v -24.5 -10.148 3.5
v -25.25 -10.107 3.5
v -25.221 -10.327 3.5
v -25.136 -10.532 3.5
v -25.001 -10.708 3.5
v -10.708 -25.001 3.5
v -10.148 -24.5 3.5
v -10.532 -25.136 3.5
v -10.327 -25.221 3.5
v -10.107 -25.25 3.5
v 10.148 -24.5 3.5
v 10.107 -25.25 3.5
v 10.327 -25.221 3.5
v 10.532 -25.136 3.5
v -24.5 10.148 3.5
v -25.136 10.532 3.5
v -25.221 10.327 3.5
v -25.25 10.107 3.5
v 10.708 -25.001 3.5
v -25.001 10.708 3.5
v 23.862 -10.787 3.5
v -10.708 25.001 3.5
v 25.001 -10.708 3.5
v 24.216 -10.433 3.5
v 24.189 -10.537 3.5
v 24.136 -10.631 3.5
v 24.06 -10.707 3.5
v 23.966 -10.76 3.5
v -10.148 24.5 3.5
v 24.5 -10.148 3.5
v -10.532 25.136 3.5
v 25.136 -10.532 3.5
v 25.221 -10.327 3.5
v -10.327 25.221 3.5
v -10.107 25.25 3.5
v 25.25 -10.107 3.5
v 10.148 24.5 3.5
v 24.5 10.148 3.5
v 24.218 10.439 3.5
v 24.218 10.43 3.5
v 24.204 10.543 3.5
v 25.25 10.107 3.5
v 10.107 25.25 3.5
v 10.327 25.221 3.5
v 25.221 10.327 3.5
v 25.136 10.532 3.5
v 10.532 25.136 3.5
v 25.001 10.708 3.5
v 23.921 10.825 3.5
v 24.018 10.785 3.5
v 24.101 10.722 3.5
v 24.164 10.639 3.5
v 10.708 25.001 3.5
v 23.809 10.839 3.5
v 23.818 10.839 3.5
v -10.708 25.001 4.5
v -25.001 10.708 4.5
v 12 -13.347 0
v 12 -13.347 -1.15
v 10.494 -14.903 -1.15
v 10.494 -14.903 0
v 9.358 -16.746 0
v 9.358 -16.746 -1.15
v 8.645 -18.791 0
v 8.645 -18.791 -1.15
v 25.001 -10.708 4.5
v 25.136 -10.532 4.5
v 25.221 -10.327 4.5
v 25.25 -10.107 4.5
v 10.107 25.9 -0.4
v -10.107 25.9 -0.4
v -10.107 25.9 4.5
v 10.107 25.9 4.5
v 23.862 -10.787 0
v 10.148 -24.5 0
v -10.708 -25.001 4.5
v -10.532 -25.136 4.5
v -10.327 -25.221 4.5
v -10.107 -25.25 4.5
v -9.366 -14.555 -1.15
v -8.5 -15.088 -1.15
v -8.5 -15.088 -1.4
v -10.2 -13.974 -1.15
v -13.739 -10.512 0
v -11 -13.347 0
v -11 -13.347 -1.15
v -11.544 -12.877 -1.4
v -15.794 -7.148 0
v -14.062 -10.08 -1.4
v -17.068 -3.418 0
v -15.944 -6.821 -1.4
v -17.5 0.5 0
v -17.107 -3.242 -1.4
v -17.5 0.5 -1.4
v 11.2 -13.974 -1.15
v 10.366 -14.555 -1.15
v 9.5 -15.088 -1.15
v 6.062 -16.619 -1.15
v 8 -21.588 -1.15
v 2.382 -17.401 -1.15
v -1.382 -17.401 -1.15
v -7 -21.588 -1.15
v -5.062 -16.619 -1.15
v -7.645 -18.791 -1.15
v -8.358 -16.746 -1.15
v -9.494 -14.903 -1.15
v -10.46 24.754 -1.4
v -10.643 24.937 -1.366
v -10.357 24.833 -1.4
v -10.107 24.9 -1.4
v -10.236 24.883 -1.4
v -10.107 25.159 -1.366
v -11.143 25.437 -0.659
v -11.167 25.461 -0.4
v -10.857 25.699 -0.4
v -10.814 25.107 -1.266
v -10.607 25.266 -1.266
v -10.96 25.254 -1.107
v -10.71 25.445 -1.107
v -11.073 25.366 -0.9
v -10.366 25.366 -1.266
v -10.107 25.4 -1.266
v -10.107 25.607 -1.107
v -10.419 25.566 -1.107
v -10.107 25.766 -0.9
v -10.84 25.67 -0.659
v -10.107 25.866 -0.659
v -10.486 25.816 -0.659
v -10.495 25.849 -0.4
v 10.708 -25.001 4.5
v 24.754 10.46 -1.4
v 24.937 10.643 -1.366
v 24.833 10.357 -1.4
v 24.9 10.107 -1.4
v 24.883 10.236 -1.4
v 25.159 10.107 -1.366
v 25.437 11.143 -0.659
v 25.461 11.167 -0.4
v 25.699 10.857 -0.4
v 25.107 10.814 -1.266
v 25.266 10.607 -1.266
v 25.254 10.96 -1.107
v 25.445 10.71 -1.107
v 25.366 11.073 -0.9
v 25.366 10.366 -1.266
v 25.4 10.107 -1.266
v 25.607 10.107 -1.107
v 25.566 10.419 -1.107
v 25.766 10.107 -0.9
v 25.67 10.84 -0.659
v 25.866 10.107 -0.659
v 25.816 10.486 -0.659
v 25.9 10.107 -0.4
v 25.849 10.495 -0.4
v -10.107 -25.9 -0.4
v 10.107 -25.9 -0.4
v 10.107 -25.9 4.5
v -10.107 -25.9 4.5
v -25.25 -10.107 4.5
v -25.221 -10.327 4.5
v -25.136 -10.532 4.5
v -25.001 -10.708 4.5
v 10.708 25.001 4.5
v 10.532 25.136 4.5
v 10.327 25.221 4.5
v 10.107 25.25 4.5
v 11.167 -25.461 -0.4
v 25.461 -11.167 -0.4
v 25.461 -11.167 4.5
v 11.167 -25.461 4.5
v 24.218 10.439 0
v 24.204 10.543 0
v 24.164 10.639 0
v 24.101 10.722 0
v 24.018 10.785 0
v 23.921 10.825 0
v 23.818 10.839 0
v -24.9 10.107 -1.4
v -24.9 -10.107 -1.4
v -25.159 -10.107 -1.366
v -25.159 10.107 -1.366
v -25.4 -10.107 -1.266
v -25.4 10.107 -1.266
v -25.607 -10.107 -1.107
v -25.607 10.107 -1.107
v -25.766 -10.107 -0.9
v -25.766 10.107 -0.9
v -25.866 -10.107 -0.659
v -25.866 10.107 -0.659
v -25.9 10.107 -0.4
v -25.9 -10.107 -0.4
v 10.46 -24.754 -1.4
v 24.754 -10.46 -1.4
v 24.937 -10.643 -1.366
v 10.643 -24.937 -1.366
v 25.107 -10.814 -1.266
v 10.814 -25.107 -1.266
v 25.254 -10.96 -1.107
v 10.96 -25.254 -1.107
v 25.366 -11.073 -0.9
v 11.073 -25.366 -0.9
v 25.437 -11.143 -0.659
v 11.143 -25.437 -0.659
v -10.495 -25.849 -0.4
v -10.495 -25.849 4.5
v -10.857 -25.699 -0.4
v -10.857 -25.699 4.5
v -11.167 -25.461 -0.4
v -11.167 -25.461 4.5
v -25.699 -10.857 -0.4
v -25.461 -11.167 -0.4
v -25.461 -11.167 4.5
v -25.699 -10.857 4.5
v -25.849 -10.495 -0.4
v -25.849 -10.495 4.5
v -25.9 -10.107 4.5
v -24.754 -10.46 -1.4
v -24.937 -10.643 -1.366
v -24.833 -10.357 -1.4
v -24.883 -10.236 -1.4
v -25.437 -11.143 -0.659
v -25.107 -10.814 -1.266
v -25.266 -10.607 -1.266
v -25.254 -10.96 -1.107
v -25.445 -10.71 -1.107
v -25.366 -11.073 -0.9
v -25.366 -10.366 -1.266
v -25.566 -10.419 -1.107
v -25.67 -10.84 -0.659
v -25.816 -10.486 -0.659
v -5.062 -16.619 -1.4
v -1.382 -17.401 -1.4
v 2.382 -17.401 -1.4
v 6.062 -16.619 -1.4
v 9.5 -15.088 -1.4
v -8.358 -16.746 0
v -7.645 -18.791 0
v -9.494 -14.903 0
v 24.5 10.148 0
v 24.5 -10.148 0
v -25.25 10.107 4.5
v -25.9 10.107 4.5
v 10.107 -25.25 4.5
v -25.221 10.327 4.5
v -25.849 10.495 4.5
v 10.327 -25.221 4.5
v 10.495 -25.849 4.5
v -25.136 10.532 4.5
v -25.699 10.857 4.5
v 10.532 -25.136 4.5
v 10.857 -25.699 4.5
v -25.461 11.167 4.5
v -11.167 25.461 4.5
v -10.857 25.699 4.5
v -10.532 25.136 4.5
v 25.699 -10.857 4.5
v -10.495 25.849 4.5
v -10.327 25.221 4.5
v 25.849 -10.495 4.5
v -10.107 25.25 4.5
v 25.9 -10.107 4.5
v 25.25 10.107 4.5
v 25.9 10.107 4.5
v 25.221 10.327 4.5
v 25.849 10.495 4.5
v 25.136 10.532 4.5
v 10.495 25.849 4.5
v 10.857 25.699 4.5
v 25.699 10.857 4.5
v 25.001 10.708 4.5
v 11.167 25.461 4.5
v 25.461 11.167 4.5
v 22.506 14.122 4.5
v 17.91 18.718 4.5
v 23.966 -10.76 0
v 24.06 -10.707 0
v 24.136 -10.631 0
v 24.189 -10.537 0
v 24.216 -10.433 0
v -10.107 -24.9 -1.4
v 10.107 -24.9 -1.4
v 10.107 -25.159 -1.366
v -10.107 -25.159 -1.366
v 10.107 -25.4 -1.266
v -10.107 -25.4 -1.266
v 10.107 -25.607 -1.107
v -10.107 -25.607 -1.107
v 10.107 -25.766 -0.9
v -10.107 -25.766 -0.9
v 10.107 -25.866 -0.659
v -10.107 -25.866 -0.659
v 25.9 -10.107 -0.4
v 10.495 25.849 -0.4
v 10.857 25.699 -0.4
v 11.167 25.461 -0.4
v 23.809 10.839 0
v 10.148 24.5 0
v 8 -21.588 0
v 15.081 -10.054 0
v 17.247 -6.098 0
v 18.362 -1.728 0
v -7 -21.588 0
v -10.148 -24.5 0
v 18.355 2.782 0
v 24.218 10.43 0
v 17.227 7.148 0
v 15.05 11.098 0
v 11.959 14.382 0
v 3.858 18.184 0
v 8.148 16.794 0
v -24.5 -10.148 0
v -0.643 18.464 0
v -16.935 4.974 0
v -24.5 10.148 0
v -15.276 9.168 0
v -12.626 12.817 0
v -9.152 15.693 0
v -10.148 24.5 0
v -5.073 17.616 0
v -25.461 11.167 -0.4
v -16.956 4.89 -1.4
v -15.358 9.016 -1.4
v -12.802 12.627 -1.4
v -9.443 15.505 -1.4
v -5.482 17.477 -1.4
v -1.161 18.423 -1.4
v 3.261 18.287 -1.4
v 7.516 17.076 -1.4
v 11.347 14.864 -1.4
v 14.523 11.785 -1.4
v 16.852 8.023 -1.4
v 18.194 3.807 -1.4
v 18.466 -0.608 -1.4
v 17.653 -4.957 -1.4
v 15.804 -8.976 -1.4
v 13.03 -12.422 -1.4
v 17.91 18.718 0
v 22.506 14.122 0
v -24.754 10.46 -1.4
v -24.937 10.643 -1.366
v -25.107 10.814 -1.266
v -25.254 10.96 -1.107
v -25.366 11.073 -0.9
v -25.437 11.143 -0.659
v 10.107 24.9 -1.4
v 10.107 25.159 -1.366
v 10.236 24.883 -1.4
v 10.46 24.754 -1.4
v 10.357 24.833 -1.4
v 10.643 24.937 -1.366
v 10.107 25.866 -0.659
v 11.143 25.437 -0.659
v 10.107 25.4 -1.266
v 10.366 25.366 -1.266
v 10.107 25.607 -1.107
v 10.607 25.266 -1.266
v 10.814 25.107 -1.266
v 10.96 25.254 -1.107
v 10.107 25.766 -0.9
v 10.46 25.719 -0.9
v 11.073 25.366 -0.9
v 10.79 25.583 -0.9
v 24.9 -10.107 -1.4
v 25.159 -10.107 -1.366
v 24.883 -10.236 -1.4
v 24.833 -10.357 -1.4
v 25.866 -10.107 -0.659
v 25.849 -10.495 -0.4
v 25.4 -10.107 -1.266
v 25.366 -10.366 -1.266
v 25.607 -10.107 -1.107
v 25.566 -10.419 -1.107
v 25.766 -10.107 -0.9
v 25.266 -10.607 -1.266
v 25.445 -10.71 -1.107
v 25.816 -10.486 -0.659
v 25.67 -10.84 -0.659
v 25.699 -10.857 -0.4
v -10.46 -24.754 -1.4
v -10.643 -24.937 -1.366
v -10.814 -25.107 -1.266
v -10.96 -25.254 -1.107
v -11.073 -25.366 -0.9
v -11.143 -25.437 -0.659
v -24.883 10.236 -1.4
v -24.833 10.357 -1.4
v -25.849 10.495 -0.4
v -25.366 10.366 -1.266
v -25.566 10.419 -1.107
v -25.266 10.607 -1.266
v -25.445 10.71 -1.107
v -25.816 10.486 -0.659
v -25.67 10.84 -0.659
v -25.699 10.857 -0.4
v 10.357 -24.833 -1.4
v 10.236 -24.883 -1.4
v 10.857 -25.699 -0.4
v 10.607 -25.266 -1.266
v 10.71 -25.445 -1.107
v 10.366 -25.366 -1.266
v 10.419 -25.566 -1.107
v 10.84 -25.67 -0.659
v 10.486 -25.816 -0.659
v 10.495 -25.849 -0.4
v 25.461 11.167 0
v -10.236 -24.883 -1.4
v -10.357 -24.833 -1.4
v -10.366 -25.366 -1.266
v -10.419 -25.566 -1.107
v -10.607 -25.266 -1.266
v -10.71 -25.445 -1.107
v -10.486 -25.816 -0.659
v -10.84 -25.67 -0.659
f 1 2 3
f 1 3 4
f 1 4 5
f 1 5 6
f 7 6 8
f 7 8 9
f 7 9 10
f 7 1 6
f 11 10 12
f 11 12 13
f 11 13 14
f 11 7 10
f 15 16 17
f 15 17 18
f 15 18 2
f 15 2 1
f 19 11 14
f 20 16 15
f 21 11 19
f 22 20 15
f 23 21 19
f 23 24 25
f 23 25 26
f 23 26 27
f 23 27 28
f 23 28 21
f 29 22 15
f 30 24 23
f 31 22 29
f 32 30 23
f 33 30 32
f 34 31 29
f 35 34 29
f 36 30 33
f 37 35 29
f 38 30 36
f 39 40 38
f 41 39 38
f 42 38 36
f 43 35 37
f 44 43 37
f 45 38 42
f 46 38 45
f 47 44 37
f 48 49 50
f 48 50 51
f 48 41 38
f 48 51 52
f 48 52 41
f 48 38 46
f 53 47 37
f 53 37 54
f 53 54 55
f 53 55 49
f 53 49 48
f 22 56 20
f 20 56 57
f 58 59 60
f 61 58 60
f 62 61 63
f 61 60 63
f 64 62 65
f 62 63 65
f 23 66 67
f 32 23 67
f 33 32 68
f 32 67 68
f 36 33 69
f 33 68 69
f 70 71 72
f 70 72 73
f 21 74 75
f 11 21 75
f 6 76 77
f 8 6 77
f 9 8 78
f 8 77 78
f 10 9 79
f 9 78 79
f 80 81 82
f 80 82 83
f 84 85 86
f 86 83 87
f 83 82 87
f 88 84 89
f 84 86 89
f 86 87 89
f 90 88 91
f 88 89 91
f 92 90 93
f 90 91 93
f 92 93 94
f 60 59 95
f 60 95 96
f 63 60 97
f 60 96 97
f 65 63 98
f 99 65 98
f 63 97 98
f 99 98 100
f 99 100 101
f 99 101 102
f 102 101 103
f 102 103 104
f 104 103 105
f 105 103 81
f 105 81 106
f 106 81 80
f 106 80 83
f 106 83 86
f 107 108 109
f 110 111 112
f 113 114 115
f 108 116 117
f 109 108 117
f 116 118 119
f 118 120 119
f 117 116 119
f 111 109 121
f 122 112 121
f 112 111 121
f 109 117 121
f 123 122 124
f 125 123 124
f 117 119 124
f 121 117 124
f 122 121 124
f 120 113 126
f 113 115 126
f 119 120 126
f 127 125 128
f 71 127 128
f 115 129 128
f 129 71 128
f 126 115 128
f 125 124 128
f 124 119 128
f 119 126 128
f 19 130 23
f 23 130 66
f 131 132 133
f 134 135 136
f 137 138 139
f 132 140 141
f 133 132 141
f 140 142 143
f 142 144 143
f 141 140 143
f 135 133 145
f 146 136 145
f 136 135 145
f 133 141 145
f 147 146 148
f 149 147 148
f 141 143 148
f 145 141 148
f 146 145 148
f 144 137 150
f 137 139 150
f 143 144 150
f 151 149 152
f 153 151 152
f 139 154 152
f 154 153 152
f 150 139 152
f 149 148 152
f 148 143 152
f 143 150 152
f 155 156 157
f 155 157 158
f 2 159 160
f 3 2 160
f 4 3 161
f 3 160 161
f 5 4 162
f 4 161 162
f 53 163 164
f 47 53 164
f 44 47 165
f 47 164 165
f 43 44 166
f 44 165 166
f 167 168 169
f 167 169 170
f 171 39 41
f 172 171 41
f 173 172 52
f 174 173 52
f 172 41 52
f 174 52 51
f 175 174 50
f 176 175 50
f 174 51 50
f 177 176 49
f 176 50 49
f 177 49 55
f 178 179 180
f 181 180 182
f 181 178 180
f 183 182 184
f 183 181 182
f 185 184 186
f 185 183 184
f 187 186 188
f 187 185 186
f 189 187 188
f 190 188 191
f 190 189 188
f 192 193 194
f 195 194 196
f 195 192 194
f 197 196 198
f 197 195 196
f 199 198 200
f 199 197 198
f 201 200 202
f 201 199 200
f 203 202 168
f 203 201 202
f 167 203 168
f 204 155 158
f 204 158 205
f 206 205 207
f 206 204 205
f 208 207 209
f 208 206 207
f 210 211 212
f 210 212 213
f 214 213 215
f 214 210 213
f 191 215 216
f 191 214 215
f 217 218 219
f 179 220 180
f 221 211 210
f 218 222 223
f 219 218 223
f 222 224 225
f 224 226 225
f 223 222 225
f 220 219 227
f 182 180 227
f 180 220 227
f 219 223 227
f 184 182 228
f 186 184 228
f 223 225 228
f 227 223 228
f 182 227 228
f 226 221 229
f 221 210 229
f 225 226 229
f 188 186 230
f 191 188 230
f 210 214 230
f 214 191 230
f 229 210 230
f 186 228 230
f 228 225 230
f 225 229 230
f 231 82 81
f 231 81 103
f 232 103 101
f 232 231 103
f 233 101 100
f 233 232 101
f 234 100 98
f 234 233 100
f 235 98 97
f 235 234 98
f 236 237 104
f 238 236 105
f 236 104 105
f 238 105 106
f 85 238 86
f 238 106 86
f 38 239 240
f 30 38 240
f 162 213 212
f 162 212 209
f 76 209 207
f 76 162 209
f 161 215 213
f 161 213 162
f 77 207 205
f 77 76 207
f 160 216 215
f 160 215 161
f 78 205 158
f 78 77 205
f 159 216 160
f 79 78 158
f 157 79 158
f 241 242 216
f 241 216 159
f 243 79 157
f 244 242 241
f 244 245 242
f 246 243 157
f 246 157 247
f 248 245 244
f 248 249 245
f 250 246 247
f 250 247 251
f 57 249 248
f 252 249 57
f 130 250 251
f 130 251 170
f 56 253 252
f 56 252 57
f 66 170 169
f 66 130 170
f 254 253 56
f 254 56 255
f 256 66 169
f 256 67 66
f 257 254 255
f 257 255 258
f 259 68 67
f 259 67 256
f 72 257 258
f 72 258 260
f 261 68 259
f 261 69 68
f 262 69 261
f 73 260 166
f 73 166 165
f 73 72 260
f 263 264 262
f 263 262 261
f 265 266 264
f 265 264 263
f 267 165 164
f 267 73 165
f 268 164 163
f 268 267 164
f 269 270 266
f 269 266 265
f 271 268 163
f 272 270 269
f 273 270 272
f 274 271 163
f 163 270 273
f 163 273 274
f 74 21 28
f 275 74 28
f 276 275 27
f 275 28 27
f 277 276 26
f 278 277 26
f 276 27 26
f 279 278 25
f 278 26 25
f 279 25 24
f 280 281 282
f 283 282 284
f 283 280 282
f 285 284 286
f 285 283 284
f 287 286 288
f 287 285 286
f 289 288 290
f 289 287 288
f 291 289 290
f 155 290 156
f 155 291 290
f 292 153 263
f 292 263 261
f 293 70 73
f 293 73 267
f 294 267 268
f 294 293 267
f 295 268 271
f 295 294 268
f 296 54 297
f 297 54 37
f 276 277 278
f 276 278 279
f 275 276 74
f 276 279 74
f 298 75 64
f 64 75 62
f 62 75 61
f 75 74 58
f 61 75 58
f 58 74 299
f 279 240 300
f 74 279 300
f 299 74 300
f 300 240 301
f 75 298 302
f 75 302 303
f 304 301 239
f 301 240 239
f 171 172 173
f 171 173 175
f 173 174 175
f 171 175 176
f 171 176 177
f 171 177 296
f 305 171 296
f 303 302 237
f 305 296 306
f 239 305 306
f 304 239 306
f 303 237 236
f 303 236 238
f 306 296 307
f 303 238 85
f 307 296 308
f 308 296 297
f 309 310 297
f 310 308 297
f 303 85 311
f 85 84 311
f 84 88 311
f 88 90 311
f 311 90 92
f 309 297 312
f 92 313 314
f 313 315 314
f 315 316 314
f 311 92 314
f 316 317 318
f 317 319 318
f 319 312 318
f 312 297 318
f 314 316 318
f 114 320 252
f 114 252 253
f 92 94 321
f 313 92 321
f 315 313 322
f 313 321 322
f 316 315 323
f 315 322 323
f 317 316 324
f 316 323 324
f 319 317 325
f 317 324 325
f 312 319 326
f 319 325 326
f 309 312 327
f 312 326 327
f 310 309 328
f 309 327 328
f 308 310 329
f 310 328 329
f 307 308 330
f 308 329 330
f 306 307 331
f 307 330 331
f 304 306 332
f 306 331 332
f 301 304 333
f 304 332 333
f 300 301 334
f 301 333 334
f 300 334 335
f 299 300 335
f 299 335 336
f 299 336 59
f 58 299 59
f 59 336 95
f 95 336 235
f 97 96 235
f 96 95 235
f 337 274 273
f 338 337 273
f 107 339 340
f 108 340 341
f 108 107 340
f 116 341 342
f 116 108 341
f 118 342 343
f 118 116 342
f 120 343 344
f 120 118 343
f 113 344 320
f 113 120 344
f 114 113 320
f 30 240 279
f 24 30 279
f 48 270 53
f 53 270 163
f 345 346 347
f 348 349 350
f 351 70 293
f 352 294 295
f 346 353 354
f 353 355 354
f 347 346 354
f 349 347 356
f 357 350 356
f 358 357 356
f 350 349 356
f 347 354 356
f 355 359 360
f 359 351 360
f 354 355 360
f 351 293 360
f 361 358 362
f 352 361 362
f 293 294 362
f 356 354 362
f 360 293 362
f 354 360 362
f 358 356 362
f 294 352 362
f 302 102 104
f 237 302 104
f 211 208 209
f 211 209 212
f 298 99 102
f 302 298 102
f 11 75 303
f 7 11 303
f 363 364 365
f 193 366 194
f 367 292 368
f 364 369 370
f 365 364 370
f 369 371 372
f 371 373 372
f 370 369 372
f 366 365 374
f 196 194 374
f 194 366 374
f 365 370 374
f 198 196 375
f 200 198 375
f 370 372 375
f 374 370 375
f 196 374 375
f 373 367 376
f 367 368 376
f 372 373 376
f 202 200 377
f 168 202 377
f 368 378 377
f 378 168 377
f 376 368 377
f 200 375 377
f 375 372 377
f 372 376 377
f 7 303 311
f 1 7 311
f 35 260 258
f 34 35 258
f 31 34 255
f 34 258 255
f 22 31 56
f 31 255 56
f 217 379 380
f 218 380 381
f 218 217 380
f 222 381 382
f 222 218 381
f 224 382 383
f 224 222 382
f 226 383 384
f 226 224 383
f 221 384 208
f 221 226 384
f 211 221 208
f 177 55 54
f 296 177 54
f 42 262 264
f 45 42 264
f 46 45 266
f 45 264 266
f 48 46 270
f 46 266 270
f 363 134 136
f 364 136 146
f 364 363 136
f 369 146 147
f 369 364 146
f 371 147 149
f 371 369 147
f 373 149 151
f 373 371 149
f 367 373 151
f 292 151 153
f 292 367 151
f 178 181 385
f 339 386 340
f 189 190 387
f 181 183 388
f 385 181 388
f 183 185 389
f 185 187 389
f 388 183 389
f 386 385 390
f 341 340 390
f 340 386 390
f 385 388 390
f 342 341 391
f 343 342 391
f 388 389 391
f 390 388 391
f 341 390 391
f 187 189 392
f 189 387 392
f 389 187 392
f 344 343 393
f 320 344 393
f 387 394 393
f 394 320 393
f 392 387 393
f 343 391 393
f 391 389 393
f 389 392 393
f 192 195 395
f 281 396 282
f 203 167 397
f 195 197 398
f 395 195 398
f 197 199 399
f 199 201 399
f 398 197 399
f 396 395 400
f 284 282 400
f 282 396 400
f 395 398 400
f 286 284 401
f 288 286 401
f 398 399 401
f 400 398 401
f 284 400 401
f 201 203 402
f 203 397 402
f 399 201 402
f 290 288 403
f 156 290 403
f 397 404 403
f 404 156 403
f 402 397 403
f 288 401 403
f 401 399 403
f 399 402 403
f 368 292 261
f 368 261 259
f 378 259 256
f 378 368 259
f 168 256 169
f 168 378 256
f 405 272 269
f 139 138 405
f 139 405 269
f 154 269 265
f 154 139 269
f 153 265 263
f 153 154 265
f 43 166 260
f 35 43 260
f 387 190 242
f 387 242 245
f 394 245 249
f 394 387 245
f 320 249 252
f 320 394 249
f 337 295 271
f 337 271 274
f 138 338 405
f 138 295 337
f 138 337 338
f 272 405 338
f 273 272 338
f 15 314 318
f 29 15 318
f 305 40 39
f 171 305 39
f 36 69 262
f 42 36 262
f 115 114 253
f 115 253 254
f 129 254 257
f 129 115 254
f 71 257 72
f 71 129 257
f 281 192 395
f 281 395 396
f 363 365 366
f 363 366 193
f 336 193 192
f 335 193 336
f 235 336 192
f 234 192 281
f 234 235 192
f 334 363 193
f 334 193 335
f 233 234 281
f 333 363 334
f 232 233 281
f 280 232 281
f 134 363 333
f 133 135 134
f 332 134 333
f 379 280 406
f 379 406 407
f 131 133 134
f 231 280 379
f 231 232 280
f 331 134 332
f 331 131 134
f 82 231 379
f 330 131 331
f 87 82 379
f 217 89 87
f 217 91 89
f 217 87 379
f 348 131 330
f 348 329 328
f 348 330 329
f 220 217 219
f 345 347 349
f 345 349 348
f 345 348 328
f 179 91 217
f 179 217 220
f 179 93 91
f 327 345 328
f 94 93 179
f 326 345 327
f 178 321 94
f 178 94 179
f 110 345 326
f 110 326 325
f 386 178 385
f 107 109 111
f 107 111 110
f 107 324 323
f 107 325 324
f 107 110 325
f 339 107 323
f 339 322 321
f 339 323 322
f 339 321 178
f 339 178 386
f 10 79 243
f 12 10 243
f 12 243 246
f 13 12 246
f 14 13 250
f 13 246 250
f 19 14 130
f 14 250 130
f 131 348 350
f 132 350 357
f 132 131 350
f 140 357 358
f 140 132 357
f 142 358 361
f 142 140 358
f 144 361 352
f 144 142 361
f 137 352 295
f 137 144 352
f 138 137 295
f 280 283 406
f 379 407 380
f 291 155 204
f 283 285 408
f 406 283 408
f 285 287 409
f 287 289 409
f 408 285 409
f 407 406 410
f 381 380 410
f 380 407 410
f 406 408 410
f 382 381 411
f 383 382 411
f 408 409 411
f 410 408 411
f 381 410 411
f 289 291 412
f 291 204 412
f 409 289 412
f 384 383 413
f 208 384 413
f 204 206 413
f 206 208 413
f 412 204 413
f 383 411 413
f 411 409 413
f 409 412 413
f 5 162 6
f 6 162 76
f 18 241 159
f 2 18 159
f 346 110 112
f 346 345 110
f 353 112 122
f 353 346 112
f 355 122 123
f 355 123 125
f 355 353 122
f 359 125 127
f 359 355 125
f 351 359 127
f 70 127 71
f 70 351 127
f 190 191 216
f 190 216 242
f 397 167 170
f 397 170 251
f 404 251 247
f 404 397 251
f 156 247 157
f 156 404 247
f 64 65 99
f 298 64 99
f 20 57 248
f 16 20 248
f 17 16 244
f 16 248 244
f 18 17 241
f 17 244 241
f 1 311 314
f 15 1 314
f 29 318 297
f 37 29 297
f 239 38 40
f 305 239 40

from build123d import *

# Parameters (mm, degrees)
BOSS_EXTRUDE1_DEPTH   = 8.5
BOSS_EXTRUDE1_2_DEPTH = 8.5
BOSS_EXTRUDE1_3_DEPTH = 8.5
BOSS_EXTRUDE1_4_DEPTH = 8.5
BOSS_EXTRUDE2_DEPTH   = 1.4
BOSS_EXTRUDE3_DEPTH   = 8.5
BOSS_EXTRUDE5_DEPTH   = 1
CUT_EXTRUDE1_DEPTH    = 38.942456431
CUT_EXTRUDE2_DEPTH    = 38.942456431
FILLET1_R             = 1
BOSS_EXTRUDE6_START   = 1.4
BOSS_EXTRUDE6_DEPTH   = 1.4
FILLET2_R             = 1
CUT_EXTRUDE3_DEPTH    = 1.4
BOSS_EXTRUDE7_DEPTH   = 0.25
FILLET3_R             = 10
CUT_EXTRUDE4_START    = -5.9
CUT_EXTRUDE4_DEPTH    = 6
CUT_EXTRUDE5_DEPTH    = 1


with BuildPart() as part:
    # Sketch1 → Boss-Extrude1 (new body)
    with BuildSketch(Plane.XY):
        with BuildLine():
            Line((25.9, -10.106810922), (25.9, 10.106810922))
            ThreePointArc((25.9, 10.106810922), (25.785819299, 10.68083607), (25.460660172, 11.167471094))
            Line((25.460660172, 11.167471094), (22.50588745, 14.122243815))
            Line((22.50588745, 14.122243815), (21.515937957, 13.132294321))
            Line((21.515937957, 13.132294321), (24.5, 10.148232278))
            Line((24.5, 10.148232278), (24.5, -10.148232278))
            Line((24.5, -10.148232278), (21.692714652, -12.955517626))
            Line((21.692714652, -12.955517626), (22.682664146, -13.94546712))
            Line((22.682664146, -13.94546712), (25.460660172, -11.167471094))
            ThreePointArc((25.460660172, -11.167471094), (25.785819299, -10.68083607), (25.9, -10.106810922))
        make_face()
    extrude(amount=BOSS_EXTRUDE1_DEPTH)



with BuildPart() as body_2:
    # Sketch1 → Boss-Extrude1 2 (new body)
    with BuildSketch(Plane.XY):
        with BuildLine():
            Line((-16.177281759, -20.450849507), (-11.167471094, -25.460660172))
            ThreePointArc((-11.167471094, -25.460660172), (-10.68083607, -25.785819299), (-10.106810922, -25.9))
            Line((-10.106810922, -25.9), (10.106810922, -25.9))
            ThreePointArc((10.106810922, -25.9), (10.68083607, -25.785819299), (11.167471094, -25.460660172))
            Line((11.167471094, -25.460660172), (15.611596334, -21.016534932))
            Line((15.611596334, -21.016534932), (14.62164684, -20.026585438))
            Line((14.62164684, -20.026585438), (10.148232278, -24.5))
            Line((10.148232278, -24.5), (-10.148232278, -24.5))
            Line((-10.148232278, -24.5), (-15.187332265, -19.460900013))
            Line((-15.187332265, -19.460900013), (-16.177281759, -20.450849507))
        make_face()
    extrude(amount=BOSS_EXTRUDE1_2_DEPTH)


with BuildPart() as body_3:
    # Sketch1 → Boss-Extrude1 3 (new body)
    with BuildSketch(Plane.XY):
        with BuildLine():
            Line((-22.116978721, 14.511152545), (-25.460660172, 11.167471094))
            ThreePointArc((-25.460660172, 11.167471094), (-25.785819299, 10.68083607), (-25.9, 10.106810922))
            Line((-25.9, 10.106810922), (-25.9, -10.106810922))
            ThreePointArc((-25.9, -10.106810922), (-25.785819299, -10.68083607), (-25.460660172, -11.167471094))
            Line((-25.460660172, -11.167471094), (-22.187689399, -14.440441867))
            Line((-22.187689399, -14.440441867), (-21.197739905, -13.450492373))
            Line((-21.197739905, -13.450492373), (-24.5, -10.148232278))
            Line((-24.5, -10.148232278), (-24.5, 10.148232278))
            Line((-24.5, 10.148232278), (-21.127029227, 13.521203051))
            Line((-21.127029227, 13.521203051), (-22.116978721, 14.511152545))
        make_face()
    extrude(amount=BOSS_EXTRUDE1_3_DEPTH)


with BuildPart() as body_4:
    # Sketch1 → Boss-Extrude1 4 (new body)
    with BuildSketch(Plane.XY):
        with BuildLine():
            Line((10.106810922, 25.9), (-10.106810922, 25.9))
            ThreePointArc((-10.106810922, 25.9), (-10.68083607, 25.785819299), (-11.167471094, 25.460660172))
            Line((-11.167471094, 25.460660172), (-17.520784643, 19.107346623))
            Line((-17.520784643, 19.107346623), (-16.530835149, 18.117397129))
            Line((-16.530835149, 18.117397129), (-10.148232278, 24.5))
            Line((-10.148232278, 24.5), (10.148232278, 24.5))
            Line((10.148232278, 24.5), (16.919743879, 17.728488399))
            Line((16.919743879, 17.728488399), (17.909693373, 18.718437893))
            Line((17.909693373, 18.718437893), (11.167471094, 25.460660172))
            ThreePointArc((11.167471094, 25.460660172), (10.68083607, 25.785819299), (10.106810922, 25.9))
        make_face()
    extrude(amount=BOSS_EXTRUDE1_4_DEPTH)


with BuildPart() as part_1:
    add(part.part)

    add(body_2.part)  # Boss-Extrude2 merges body 2

    add(body_3.part)  # Boss-Extrude2 merges body 3

    add(body_4.part)  # Boss-Extrude2 merges body 4
    # Sketch2 → Boss-Extrude2 (add)
    with BuildSketch(Plane.XY.offset(8.5)):
        with BuildLine():
            ThreePointArc((25.460660172, -11.167471094), (25.785819299, -10.68083607), (25.9, -10.106810922))
            Line((25.9, -10.106810922), (25.9, 10.106810922))
            ThreePointArc((25.9, 10.106810922), (25.785819299, 10.68083607), (25.460660172, 11.167471094))
            Line((25.460660172, 11.167471094), (11.167471094, 25.460660172))
            ThreePointArc((11.167471094, 25.460660172), (10.68083607, 25.785819299), (10.106810922, 25.9))
            Line((10.106810922, 25.9), (-10.106810922, 25.9))
            ThreePointArc((-10.106810922, 25.9), (-10.68083607, 25.785819299), (-11.167471094, 25.460660172))
            Line((-11.167471094, 25.460660172), (-25.460660172, 11.167471094))
            ThreePointArc((-25.460660172, 11.167471094), (-25.785819299, 10.68083607), (-25.9, 10.106810922))
            Line((-25.9, 10.106810922), (-25.9, -10.106810922))
            ThreePointArc((-25.9, -10.106810922), (-25.785819299, -10.68083607), (-25.460660172, -11.167471094))
            Line((-25.460660172, -11.167471094), (-11.167471094, -25.460660172))
            ThreePointArc((-11.167471094, -25.460660172), (-10.68083607, -25.785819299), (-10.106810922, -25.9))
            Line((-10.106810922, -25.9), (10.106810922, -25.9))
            ThreePointArc((10.106810922, -25.9), (10.68083607, -25.785819299), (11.167471094, -25.460660172))
            Line((11.167471094, -25.460660172), (25.460660172, -11.167471094))
        make_face()
    extrude(amount=BOSS_EXTRUDE2_DEPTH)

    # Sketch3 → Boss-Extrude3 (add)
    with BuildSketch(Plane(origin=(0, 0, 8.5), x_dir=(-1, 0, 0), z_dir=(0, 0, -1))):
        Polygon((-21.515937957, 13.132294321), (-16.919743879, 17.728488399), (-17.909693373, 18.718437893), (-22.50588745, 14.122243815), align=None)
        Polygon((21.127029227, 13.521203051), (16.530835149, 18.117397129), (17.520784643, 19.107346623), (22.116978721, 14.511152545), align=None)
        Polygon((-21.692714652, -12.955517626), (-22.682664146, -13.94546712), (-15.611596334, -21.016534932), (-14.62164684, -20.026585438), align=None)
        Polygon((15.187332265, -19.460900013), (16.177281759, -20.450849507), (22.187689399, -14.440441867), (21.197739905, -13.450492373), align=None)
    extrude(amount=BOSS_EXTRUDE3_DEPTH)

    # Sketch5 → Boss-Extrude5 (add)
    with BuildSketch(Plane(origin=(0, 0, 8.5), x_dir=(-1, 0, 0), z_dir=(0, 0, -1))):
        Polygon((16.177281759, -20.450849507), (22.187689399, -14.440441867), (21.197739905, -13.450492373), (15.187332265, -19.460900013), align=None)
    extrude(amount=BOSS_EXTRUDE5_DEPTH)

    # Sketch6 → Cut-Extrude1 (cut, through all)
    with BuildSketch(Plane.XY.offset(9.9)):
        with BuildLine():
            Line((-20.332854575, -10.39399953), (-20.332854823, 10.43400047))
            ThreePointArc((-20.332854823, 10.43400047), (-20.450012114, 10.716843181), (-20.732854828, 10.834000465))
            Line((-20.732854828, 10.834000465), (-23.272854828, 10.834000435))
            ThreePointArc((-23.272854828, 10.834000435), (-23.555697539, 10.716843144), (-23.672854823, 10.43400043))
            Line((-23.672854823, 10.43400043), (-23.672854575, -10.39399957))
            ThreePointArc((-23.672854575, -10.39399957), (-23.555697284, -10.676842281), (-23.27285457, -10.793999565))
            Line((-23.27285457, -10.793999565), (-20.73285457, -10.793999535))
            ThreePointArc((-20.73285457, -10.793999535), (-20.450011859, -10.676842244), (-20.332854575, -10.39399953))
        make_face()
        with BuildLine():
            Line((21.277947318, -10.789000444), (23.817947318, -10.789000333))
            ThreePointArc((23.817947318, -10.789000333), (24.100790025, -10.671843033), (24.217947301, -10.389000316))
            Line((24.217947301, -10.389000316), (24.21794639, 10.438999684))
            ThreePointArc((24.21794639, 10.438999684), (24.10078909, 10.721842391), (23.817946373, 10.838999667))
            Line((23.817946373, 10.838999667), (21.277946373, 10.838999556))
            ThreePointArc((21.277946373, 10.838999556), (20.995103665, 10.721842256), (20.87794639, 10.438999538))
            Line((20.87794639, 10.438999538), (20.877947301, -10.389000462))
            ThreePointArc((20.877947301, -10.389000462), (20.995104601, -10.671843169), (21.277947318, -10.789000444))
        make_face()
    extrude(amount=-CUT_EXTRUDE1_DEPTH, mode=Mode.SUBTRACT)

    # Sketch7 → Cut-Extrude2 (cut, through all)
    # profile 1 of 2: a face of its own
    with BuildSketch(Plane.XY.offset(9.9)):
        with BuildLine():
            ThreePointArc((-11.582455432, -19.595401386), (-11.465298194, -19.312558653), (-11.182455502, -19.195401316))
            Line((-11.182455502, -19.195401316), (11.677544498, -19.195397319))
            ThreePointArc((11.677544498, -19.195397319), (11.960387231, -19.312554557), (12.077544568, -19.595397249))
            Line((12.077544568, -19.595397249), (12.077545003, -22.084597249))
            ThreePointArc((12.077545003, -22.084597249), (11.960387765, -22.367439982), (11.677545073, -22.484597319))
            Line((11.677545073, -22.484597319), (9.391545073, -22.484597719))
            Line((9.391545073, -22.484597719), (-8.896454927, -22.484600916))
            Line((-8.896454927, -22.484600916), (-11.182454927, -22.484601316))
            ThreePointArc((-11.182454927, -22.484601316), (-11.46529766, -22.367444078), (-11.582454997, -22.084601386))
            Line((-11.582454997, -22.084601386), (-11.582455432, -19.595401386))
        make_face()
        Polygon((9.391545003, -22.084597719), (11.677545003, -22.084597319), (11.677544568, -19.595397319), (-11.182455432, -19.595401316), (-11.182454997, -22.084601316), (-8.896454997, -22.084600916), align=None, mode=Mode.SUBTRACT)
    # profile 2 of 2: a face of its own
    with BuildSketch(Plane.XY.offset(9.9)):
        Polygon((9.391545003, -22.084597719), (-8.896454997, -22.084600916), (-11.182454997, -22.084601316), (-11.182455432, -19.595401316), (11.677544568, -19.595397319), (11.677545003, -22.084597319), align=None)
    extrude(amount=-CUT_EXTRUDE2_DEPTH, mode=Mode.SUBTRACT)

    # Fillet1
    fillet1_edges = [part_1.edges().sort_by_distance(p)[0] for p in [
        (18.314065633, 18.314065633, 9.9),
        (10.68083607, 25.785819299, 9.9),
        (0, 25.9, 9.9),
        (-10.68083607, 25.785819299, 9.9),
        (-18.314065633, 18.314065633, 9.9),
        (-25.785819299, 10.68083607, 9.9),
        (-25.9, 0, 9.9),
        (-25.785819299, -10.68083607, 9.9),
        (-18.314065633, -18.314065633, 9.9),
        (-10.68083607, -25.785819299, 9.9),
        (0, -25.9, 9.9),
        (10.68083607, -25.785819299, 9.9),
        (18.314065633, -18.314065633, 9.9),
        (25.785819299, -10.68083607, 9.9),
        (25.9, 0, 9.9),
        (25.785819299, 10.68083607, 9.9),
    ]]
    fillet(fillet1_edges, radius=FILLET1_R)

    # Sketch8 → Boss-Extrude6 (add)
    with BuildSketch(Plane(origin=(0, 0, 0), x_dir=(-1, 0, 0), z_dir=(0, 0, -1)).offset(BOSS_EXTRUDE6_START)):
        with BuildLine():
            Line((-11.167471094, 25.460660172), (-25.460660172, 11.167471094))
            ThreePointArc((-25.460660172, 11.167471094), (-25.785819299, 10.68083607), (-25.9, 10.106810922))
            Line((-25.9, 10.106810922), (-25.9, -10.106810922))
            ThreePointArc((-25.9, -10.106810922), (-25.785819299, -10.68083607), (-25.460660172, -11.167471094))
            Line((-25.460660172, -11.167471094), (-11.167471094, -25.460660172))
            ThreePointArc((-11.167471094, -25.460660172), (-10.68083607, -25.785819299), (-10.106810922, -25.9))
            Line((-10.106810922, -25.9), (10.106810922, -25.9))
            ThreePointArc((10.106810922, -25.9), (10.68083607, -25.785819299), (11.167471094, -25.460660172))
            Line((11.167471094, -25.460660172), (25.460660172, -11.167471094))
            ThreePointArc((25.460660172, -11.167471094), (25.785819299, -10.68083607), (25.9, -10.106810922))
            Line((25.9, -10.106810922), (25.9, 10.106810922))
            ThreePointArc((25.9, 10.106810922), (25.785819299, 10.68083607), (25.460660172, 11.167471094))
            Line((25.460660172, 11.167471094), (11.167471094, 25.460660172))
            ThreePointArc((11.167471094, 25.460660172), (10.68083607, 25.785819299), (10.106810922, 25.9))
            Line((10.106810922, 25.9), (-10.106810922, 25.9))
            ThreePointArc((-10.106810922, 25.9), (-10.68083607, 25.785819299), (-11.167471094, 25.460660172))
        make_face()
    extrude(amount=-BOSS_EXTRUDE6_DEPTH)

    # Fillet2
    fillet2_edges = [part_1.edges().sort_by_distance(p)[0] for p in [
        (10.68083607, 25.785819299, -1.4),
        (18.314065633, 18.314065633, -1.4),
        (25.785819299, 10.68083607, -1.4),
        (25.9, 0, -1.4),
        (25.785819299, -10.68083607, -1.4),
        (18.314065633, -18.314065633, -1.4),
        (10.68083607, -25.785819299, -1.4),
        (0, -25.9, -1.4),
        (-10.68083607, -25.785819299, -1.4),
        (-18.314065633, -18.314065633, -1.4),
        (-25.785819299, -10.68083607, -1.4),
        (-25.9, 0, -1.4),
        (-25.785819299, 10.68083607, -1.4),
        (-18.314065633, 18.314065633, -1.4),
        (-10.68083607, 25.785819299, -1.4),
        (0, 25.9, -1.4),
    ]]
    fillet(fillet2_edges, radius=FILLET2_R)

    # Sketch9 → Cut-Extrude3 (cut)
    with BuildSketch(Plane(origin=(0, 0, -1.4), x_dir=(-1, 0, 0), z_dir=(0, 0, -1))):
        with BuildLine():
            ThreePointArc((17.5, 0.5), (-9.5, 16.088457268), (-9.5, -15.088457268))
            Line((-9.5, -15.088457268), (8.5, -15.088457268))
            ThreePointArc((8.5, -15.088457268), (15.088457268, -8.5), (17.5, 0.5))
        make_face()
        with BuildLine():
            Line((8.5, -15.088457268), (-9.5, -15.088457268))
            ThreePointArc((-9.5, -15.088457268), (-0.5, -17.5), (8.5, -15.088457268))
        make_face()
        with BuildLine():
            ThreePointArc((8.5, -15.088457268), (-0.5, -17.5), (-9.5, -15.088457268))
            Line((-9.5, -15.088457268), (-8, -21.588457268))
            Line((-8, -21.588457268), (7, -21.588457268))
            Line((7, -21.588457268), (8.5, -15.088457268))
        make_face()
    extrude(amount=-CUT_EXTRUDE3_DEPTH, mode=Mode.SUBTRACT)

    # Sketch9<3> → Boss-Extrude7 (add)
    with BuildSketch(Plane(origin=(0, 0, -1.4), x_dir=(-1, 0, 0), z_dir=(0, 0, -1))):
        with BuildLine():
            ThreePointArc((8.5, -15.088457268), (-0.5, -17.5), (-9.5, -15.088457268))
            Line((-9.5, -15.088457268), (-8, -21.588457268))
            Line((-8, -21.588457268), (7, -21.588457268))
            Line((7, -21.588457268), (8.5, -15.088457268))
        make_face()
    extrude(amount=-BOSS_EXTRUDE7_DEPTH)

    # Fillet3
    # the kernel refuses this fillet: 10 mm, written as the material it takes off along each edge
    with BuildSketch(Plane(origin=(9.5, -15.088457268, -1.15), x_dir=(0.8205991500669837, 0.5715041862570599, 0), z_dir=(0, 0, 1))) as fillet3_piece_1_section:
        with BuildLine():
            CenterArc((3.893328157, -9.964118034), FILLET3_R, 94.85518398, 37.295015249)
            Line((-2.817436219, -2.550236359), (0, 0))
            ThreePointArc((0, 0), (1.523476235, -0.064587539), (3.046952471, 0))
        make_face()
    fillet3_piece_1 = extrude(amount=10.650543516, mode=Mode.PRIVATE)
    fillet3_piece_1 = split(fillet3_piece_1, bisect_by=Plane(origin=(9.843769385, -15.549562691, 8.5), z_dir=(0, 0, -1)), keep=Keep.TOP, mode=Mode.PRIVATE)
    add(fillet3_piece_1, mode=Mode.SUBTRACT)
    with BuildSketch(Plane(origin=(-8.5, -15.088457268, -1.15), x_dir=(-0.8205991500669784, 0.5715041862570673, 0), z_dir=(0, 0, 1))) as fillet3_piece_2_section:
        with BuildLine():
            CenterArc((3.893328157, 9.964118034), FILLET3_R, 227.849800771, 37.295015249)
            Line((-2.817436219, 2.550236359), (0, 0))
            ThreePointArc((0, 0), (1.523476235, 0.064587539), (3.046952471, 0))
        make_face()
    fillet3_piece_2 = extrude(amount=10.650543516, mode=Mode.PRIVATE)
    fillet3_piece_2 = split(fillet3_piece_2, bisect_by=Plane(origin=(-8.843769385, -15.549562691, 8.5), z_dir=(0, 0, -1)), keep=Keep.TOP, mode=Mode.PRIVATE)
    add(fillet3_piece_2, mode=Mode.SUBTRACT)

    # Sketch10 → Cut-Extrude4 (cut)
    with BuildSketch(Plane(origin=(0, 0, -1.4), x_dir=(-1, 0, 0), z_dir=(0, 0, -1)).offset(CUT_EXTRUDE4_START)):
        with BuildLine():
            Line((-11.167471094, -25.460660172), (-25.460660172, -11.167471094))
            ThreePointArc((-25.460660172, -11.167471094), (-25.785819299, -10.68083607), (-25.9, -10.106810922))
            Line((-25.9, -10.106810922), (-25.9, 10.106810922))
            ThreePointArc((-25.9, 10.106810922), (-25.785819299, 10.68083607), (-25.460660172, 11.167471094))
            Line((-25.460660172, 11.167471094), (-11.167471094, 25.460660172))
            ThreePointArc((-11.167471094, 25.460660172), (-10.68083607, 25.785819299), (-10.106810922, 25.9))
            Line((-10.106810922, 25.9), (10.106810922, 25.9))
            ThreePointArc((10.106810922, 25.9), (10.68083607, 25.785819299), (11.167471094, 25.460660172))
            Line((11.167471094, 25.460660172), (25.460660172, 11.167471094))
            ThreePointArc((25.460660172, 11.167471094), (25.785819299, 10.68083607), (25.9, 10.106810922))
            Line((25.9, 10.106810922), (25.9, -10.106810922))
            ThreePointArc((25.9, -10.106810922), (25.785819299, -10.68083607), (25.460660172, -11.167471094))
            Line((25.460660172, -11.167471094), (11.167471094, -25.460660172))
            ThreePointArc((11.167471094, -25.460660172), (10.68083607, -25.785819299), (10.106810922, -25.9))
            Line((10.106810922, -25.9), (-10.106810922, -25.9))
            ThreePointArc((-10.106810922, -25.9), (-10.68083607, -25.785819299), (-11.167471094, -25.460660172))
        make_face()
    extrude(amount=-CUT_EXTRUDE4_DEPTH, mode=Mode.SUBTRACT)

    # Sketch11 → Cut-Extrude5 (cut)
    with BuildSketch(Plane.XY.offset(4.5)):
        with BuildLine():
            Line((10.106810922, 25.25), (-10.106810922, 25.25))
            ThreePointArc((-10.106810922, 25.25), (-10.432091839, 25.185297603), (-10.707851686, 25.001040764))
            Line((-10.707851686, 25.001040764), (-25.001040764, 10.707851686))
            ThreePointArc((-25.001040764, 10.707851686), (-25.185297603, 10.432091839), (-25.25, 10.106810922))
            Line((-25.25, 10.106810922), (-25.25, -10.106810922))
            ThreePointArc((-25.25, -10.106810922), (-25.185297603, -10.432091839), (-25.001040764, -10.707851686))
            Line((-25.001040764, -10.707851686), (-10.707851686, -25.001040764))
            ThreePointArc((-10.707851686, -25.001040764), (-10.432091839, -25.185297603), (-10.106810922, -25.25))
            Line((-10.106810922, -25.25), (10.106810922, -25.25))
            ThreePointArc((10.106810922, -25.25), (10.432091839, -25.185297603), (10.707851686, -25.001040764))
            Line((10.707851686, -25.001040764), (25.001040764, -10.707851686))
            ThreePointArc((25.001040764, -10.707851686), (25.185297603, -10.432091839), (25.25, -10.106810922))
            Line((25.25, -10.106810922), (25.25, 10.106810922))
            ThreePointArc((25.25, 10.106810922), (25.185297603, 10.432091839), (25.001040764, 10.707851686))
            Line((25.001040764, 10.707851686), (10.707851686, 25.001040764))
            ThreePointArc((10.707851686, 25.001040764), (10.432091839, 25.185297603), (10.106810922, 25.25))
        make_face()
        with BuildLine():
            Line((10.148232278, -24.5), (-10.148232278, -24.5))
            Line((-10.148232278, -24.5), (-24.5, -10.148232278))
            Line((-24.5, -10.148232278), (-24.5, 10.148232278))
            Line((-24.5, 10.148232278), (-10.148232278, 24.5))
            Line((-10.148232278, 24.5), (10.148232278, 24.5))
            Line((10.148232278, 24.5), (23.809232612, 10.838999666))
            Line((23.809232612, 10.838999666), (23.817946373, 10.838999667))
            ThreePointArc((23.817946373, 10.838999667), (24.10078909, 10.721842391), (24.21794639, 10.438999684))
            Line((24.21794639, 10.438999684), (24.217946391, 10.430285888))
            Line((24.217946391, 10.430285888), (24.5, 10.148232278))
            Line((24.5, 10.148232278), (24.5, -10.148232278))
            Line((24.5, -10.148232278), (24.215555624, -10.432676654))
            ThreePointArc((24.215555624, -10.432676654), (24.100790013, -10.671843046), (23.861623621, -10.786608657))
            Line((23.861623621, -10.786608657), (10.148232278, -24.5))
        make_face(mode=Mode.SUBTRACT)
    extrude(amount=-CUT_EXTRUDE5_DEPTH, mode=Mode.SUBTRACT)


solid = part_1.part
